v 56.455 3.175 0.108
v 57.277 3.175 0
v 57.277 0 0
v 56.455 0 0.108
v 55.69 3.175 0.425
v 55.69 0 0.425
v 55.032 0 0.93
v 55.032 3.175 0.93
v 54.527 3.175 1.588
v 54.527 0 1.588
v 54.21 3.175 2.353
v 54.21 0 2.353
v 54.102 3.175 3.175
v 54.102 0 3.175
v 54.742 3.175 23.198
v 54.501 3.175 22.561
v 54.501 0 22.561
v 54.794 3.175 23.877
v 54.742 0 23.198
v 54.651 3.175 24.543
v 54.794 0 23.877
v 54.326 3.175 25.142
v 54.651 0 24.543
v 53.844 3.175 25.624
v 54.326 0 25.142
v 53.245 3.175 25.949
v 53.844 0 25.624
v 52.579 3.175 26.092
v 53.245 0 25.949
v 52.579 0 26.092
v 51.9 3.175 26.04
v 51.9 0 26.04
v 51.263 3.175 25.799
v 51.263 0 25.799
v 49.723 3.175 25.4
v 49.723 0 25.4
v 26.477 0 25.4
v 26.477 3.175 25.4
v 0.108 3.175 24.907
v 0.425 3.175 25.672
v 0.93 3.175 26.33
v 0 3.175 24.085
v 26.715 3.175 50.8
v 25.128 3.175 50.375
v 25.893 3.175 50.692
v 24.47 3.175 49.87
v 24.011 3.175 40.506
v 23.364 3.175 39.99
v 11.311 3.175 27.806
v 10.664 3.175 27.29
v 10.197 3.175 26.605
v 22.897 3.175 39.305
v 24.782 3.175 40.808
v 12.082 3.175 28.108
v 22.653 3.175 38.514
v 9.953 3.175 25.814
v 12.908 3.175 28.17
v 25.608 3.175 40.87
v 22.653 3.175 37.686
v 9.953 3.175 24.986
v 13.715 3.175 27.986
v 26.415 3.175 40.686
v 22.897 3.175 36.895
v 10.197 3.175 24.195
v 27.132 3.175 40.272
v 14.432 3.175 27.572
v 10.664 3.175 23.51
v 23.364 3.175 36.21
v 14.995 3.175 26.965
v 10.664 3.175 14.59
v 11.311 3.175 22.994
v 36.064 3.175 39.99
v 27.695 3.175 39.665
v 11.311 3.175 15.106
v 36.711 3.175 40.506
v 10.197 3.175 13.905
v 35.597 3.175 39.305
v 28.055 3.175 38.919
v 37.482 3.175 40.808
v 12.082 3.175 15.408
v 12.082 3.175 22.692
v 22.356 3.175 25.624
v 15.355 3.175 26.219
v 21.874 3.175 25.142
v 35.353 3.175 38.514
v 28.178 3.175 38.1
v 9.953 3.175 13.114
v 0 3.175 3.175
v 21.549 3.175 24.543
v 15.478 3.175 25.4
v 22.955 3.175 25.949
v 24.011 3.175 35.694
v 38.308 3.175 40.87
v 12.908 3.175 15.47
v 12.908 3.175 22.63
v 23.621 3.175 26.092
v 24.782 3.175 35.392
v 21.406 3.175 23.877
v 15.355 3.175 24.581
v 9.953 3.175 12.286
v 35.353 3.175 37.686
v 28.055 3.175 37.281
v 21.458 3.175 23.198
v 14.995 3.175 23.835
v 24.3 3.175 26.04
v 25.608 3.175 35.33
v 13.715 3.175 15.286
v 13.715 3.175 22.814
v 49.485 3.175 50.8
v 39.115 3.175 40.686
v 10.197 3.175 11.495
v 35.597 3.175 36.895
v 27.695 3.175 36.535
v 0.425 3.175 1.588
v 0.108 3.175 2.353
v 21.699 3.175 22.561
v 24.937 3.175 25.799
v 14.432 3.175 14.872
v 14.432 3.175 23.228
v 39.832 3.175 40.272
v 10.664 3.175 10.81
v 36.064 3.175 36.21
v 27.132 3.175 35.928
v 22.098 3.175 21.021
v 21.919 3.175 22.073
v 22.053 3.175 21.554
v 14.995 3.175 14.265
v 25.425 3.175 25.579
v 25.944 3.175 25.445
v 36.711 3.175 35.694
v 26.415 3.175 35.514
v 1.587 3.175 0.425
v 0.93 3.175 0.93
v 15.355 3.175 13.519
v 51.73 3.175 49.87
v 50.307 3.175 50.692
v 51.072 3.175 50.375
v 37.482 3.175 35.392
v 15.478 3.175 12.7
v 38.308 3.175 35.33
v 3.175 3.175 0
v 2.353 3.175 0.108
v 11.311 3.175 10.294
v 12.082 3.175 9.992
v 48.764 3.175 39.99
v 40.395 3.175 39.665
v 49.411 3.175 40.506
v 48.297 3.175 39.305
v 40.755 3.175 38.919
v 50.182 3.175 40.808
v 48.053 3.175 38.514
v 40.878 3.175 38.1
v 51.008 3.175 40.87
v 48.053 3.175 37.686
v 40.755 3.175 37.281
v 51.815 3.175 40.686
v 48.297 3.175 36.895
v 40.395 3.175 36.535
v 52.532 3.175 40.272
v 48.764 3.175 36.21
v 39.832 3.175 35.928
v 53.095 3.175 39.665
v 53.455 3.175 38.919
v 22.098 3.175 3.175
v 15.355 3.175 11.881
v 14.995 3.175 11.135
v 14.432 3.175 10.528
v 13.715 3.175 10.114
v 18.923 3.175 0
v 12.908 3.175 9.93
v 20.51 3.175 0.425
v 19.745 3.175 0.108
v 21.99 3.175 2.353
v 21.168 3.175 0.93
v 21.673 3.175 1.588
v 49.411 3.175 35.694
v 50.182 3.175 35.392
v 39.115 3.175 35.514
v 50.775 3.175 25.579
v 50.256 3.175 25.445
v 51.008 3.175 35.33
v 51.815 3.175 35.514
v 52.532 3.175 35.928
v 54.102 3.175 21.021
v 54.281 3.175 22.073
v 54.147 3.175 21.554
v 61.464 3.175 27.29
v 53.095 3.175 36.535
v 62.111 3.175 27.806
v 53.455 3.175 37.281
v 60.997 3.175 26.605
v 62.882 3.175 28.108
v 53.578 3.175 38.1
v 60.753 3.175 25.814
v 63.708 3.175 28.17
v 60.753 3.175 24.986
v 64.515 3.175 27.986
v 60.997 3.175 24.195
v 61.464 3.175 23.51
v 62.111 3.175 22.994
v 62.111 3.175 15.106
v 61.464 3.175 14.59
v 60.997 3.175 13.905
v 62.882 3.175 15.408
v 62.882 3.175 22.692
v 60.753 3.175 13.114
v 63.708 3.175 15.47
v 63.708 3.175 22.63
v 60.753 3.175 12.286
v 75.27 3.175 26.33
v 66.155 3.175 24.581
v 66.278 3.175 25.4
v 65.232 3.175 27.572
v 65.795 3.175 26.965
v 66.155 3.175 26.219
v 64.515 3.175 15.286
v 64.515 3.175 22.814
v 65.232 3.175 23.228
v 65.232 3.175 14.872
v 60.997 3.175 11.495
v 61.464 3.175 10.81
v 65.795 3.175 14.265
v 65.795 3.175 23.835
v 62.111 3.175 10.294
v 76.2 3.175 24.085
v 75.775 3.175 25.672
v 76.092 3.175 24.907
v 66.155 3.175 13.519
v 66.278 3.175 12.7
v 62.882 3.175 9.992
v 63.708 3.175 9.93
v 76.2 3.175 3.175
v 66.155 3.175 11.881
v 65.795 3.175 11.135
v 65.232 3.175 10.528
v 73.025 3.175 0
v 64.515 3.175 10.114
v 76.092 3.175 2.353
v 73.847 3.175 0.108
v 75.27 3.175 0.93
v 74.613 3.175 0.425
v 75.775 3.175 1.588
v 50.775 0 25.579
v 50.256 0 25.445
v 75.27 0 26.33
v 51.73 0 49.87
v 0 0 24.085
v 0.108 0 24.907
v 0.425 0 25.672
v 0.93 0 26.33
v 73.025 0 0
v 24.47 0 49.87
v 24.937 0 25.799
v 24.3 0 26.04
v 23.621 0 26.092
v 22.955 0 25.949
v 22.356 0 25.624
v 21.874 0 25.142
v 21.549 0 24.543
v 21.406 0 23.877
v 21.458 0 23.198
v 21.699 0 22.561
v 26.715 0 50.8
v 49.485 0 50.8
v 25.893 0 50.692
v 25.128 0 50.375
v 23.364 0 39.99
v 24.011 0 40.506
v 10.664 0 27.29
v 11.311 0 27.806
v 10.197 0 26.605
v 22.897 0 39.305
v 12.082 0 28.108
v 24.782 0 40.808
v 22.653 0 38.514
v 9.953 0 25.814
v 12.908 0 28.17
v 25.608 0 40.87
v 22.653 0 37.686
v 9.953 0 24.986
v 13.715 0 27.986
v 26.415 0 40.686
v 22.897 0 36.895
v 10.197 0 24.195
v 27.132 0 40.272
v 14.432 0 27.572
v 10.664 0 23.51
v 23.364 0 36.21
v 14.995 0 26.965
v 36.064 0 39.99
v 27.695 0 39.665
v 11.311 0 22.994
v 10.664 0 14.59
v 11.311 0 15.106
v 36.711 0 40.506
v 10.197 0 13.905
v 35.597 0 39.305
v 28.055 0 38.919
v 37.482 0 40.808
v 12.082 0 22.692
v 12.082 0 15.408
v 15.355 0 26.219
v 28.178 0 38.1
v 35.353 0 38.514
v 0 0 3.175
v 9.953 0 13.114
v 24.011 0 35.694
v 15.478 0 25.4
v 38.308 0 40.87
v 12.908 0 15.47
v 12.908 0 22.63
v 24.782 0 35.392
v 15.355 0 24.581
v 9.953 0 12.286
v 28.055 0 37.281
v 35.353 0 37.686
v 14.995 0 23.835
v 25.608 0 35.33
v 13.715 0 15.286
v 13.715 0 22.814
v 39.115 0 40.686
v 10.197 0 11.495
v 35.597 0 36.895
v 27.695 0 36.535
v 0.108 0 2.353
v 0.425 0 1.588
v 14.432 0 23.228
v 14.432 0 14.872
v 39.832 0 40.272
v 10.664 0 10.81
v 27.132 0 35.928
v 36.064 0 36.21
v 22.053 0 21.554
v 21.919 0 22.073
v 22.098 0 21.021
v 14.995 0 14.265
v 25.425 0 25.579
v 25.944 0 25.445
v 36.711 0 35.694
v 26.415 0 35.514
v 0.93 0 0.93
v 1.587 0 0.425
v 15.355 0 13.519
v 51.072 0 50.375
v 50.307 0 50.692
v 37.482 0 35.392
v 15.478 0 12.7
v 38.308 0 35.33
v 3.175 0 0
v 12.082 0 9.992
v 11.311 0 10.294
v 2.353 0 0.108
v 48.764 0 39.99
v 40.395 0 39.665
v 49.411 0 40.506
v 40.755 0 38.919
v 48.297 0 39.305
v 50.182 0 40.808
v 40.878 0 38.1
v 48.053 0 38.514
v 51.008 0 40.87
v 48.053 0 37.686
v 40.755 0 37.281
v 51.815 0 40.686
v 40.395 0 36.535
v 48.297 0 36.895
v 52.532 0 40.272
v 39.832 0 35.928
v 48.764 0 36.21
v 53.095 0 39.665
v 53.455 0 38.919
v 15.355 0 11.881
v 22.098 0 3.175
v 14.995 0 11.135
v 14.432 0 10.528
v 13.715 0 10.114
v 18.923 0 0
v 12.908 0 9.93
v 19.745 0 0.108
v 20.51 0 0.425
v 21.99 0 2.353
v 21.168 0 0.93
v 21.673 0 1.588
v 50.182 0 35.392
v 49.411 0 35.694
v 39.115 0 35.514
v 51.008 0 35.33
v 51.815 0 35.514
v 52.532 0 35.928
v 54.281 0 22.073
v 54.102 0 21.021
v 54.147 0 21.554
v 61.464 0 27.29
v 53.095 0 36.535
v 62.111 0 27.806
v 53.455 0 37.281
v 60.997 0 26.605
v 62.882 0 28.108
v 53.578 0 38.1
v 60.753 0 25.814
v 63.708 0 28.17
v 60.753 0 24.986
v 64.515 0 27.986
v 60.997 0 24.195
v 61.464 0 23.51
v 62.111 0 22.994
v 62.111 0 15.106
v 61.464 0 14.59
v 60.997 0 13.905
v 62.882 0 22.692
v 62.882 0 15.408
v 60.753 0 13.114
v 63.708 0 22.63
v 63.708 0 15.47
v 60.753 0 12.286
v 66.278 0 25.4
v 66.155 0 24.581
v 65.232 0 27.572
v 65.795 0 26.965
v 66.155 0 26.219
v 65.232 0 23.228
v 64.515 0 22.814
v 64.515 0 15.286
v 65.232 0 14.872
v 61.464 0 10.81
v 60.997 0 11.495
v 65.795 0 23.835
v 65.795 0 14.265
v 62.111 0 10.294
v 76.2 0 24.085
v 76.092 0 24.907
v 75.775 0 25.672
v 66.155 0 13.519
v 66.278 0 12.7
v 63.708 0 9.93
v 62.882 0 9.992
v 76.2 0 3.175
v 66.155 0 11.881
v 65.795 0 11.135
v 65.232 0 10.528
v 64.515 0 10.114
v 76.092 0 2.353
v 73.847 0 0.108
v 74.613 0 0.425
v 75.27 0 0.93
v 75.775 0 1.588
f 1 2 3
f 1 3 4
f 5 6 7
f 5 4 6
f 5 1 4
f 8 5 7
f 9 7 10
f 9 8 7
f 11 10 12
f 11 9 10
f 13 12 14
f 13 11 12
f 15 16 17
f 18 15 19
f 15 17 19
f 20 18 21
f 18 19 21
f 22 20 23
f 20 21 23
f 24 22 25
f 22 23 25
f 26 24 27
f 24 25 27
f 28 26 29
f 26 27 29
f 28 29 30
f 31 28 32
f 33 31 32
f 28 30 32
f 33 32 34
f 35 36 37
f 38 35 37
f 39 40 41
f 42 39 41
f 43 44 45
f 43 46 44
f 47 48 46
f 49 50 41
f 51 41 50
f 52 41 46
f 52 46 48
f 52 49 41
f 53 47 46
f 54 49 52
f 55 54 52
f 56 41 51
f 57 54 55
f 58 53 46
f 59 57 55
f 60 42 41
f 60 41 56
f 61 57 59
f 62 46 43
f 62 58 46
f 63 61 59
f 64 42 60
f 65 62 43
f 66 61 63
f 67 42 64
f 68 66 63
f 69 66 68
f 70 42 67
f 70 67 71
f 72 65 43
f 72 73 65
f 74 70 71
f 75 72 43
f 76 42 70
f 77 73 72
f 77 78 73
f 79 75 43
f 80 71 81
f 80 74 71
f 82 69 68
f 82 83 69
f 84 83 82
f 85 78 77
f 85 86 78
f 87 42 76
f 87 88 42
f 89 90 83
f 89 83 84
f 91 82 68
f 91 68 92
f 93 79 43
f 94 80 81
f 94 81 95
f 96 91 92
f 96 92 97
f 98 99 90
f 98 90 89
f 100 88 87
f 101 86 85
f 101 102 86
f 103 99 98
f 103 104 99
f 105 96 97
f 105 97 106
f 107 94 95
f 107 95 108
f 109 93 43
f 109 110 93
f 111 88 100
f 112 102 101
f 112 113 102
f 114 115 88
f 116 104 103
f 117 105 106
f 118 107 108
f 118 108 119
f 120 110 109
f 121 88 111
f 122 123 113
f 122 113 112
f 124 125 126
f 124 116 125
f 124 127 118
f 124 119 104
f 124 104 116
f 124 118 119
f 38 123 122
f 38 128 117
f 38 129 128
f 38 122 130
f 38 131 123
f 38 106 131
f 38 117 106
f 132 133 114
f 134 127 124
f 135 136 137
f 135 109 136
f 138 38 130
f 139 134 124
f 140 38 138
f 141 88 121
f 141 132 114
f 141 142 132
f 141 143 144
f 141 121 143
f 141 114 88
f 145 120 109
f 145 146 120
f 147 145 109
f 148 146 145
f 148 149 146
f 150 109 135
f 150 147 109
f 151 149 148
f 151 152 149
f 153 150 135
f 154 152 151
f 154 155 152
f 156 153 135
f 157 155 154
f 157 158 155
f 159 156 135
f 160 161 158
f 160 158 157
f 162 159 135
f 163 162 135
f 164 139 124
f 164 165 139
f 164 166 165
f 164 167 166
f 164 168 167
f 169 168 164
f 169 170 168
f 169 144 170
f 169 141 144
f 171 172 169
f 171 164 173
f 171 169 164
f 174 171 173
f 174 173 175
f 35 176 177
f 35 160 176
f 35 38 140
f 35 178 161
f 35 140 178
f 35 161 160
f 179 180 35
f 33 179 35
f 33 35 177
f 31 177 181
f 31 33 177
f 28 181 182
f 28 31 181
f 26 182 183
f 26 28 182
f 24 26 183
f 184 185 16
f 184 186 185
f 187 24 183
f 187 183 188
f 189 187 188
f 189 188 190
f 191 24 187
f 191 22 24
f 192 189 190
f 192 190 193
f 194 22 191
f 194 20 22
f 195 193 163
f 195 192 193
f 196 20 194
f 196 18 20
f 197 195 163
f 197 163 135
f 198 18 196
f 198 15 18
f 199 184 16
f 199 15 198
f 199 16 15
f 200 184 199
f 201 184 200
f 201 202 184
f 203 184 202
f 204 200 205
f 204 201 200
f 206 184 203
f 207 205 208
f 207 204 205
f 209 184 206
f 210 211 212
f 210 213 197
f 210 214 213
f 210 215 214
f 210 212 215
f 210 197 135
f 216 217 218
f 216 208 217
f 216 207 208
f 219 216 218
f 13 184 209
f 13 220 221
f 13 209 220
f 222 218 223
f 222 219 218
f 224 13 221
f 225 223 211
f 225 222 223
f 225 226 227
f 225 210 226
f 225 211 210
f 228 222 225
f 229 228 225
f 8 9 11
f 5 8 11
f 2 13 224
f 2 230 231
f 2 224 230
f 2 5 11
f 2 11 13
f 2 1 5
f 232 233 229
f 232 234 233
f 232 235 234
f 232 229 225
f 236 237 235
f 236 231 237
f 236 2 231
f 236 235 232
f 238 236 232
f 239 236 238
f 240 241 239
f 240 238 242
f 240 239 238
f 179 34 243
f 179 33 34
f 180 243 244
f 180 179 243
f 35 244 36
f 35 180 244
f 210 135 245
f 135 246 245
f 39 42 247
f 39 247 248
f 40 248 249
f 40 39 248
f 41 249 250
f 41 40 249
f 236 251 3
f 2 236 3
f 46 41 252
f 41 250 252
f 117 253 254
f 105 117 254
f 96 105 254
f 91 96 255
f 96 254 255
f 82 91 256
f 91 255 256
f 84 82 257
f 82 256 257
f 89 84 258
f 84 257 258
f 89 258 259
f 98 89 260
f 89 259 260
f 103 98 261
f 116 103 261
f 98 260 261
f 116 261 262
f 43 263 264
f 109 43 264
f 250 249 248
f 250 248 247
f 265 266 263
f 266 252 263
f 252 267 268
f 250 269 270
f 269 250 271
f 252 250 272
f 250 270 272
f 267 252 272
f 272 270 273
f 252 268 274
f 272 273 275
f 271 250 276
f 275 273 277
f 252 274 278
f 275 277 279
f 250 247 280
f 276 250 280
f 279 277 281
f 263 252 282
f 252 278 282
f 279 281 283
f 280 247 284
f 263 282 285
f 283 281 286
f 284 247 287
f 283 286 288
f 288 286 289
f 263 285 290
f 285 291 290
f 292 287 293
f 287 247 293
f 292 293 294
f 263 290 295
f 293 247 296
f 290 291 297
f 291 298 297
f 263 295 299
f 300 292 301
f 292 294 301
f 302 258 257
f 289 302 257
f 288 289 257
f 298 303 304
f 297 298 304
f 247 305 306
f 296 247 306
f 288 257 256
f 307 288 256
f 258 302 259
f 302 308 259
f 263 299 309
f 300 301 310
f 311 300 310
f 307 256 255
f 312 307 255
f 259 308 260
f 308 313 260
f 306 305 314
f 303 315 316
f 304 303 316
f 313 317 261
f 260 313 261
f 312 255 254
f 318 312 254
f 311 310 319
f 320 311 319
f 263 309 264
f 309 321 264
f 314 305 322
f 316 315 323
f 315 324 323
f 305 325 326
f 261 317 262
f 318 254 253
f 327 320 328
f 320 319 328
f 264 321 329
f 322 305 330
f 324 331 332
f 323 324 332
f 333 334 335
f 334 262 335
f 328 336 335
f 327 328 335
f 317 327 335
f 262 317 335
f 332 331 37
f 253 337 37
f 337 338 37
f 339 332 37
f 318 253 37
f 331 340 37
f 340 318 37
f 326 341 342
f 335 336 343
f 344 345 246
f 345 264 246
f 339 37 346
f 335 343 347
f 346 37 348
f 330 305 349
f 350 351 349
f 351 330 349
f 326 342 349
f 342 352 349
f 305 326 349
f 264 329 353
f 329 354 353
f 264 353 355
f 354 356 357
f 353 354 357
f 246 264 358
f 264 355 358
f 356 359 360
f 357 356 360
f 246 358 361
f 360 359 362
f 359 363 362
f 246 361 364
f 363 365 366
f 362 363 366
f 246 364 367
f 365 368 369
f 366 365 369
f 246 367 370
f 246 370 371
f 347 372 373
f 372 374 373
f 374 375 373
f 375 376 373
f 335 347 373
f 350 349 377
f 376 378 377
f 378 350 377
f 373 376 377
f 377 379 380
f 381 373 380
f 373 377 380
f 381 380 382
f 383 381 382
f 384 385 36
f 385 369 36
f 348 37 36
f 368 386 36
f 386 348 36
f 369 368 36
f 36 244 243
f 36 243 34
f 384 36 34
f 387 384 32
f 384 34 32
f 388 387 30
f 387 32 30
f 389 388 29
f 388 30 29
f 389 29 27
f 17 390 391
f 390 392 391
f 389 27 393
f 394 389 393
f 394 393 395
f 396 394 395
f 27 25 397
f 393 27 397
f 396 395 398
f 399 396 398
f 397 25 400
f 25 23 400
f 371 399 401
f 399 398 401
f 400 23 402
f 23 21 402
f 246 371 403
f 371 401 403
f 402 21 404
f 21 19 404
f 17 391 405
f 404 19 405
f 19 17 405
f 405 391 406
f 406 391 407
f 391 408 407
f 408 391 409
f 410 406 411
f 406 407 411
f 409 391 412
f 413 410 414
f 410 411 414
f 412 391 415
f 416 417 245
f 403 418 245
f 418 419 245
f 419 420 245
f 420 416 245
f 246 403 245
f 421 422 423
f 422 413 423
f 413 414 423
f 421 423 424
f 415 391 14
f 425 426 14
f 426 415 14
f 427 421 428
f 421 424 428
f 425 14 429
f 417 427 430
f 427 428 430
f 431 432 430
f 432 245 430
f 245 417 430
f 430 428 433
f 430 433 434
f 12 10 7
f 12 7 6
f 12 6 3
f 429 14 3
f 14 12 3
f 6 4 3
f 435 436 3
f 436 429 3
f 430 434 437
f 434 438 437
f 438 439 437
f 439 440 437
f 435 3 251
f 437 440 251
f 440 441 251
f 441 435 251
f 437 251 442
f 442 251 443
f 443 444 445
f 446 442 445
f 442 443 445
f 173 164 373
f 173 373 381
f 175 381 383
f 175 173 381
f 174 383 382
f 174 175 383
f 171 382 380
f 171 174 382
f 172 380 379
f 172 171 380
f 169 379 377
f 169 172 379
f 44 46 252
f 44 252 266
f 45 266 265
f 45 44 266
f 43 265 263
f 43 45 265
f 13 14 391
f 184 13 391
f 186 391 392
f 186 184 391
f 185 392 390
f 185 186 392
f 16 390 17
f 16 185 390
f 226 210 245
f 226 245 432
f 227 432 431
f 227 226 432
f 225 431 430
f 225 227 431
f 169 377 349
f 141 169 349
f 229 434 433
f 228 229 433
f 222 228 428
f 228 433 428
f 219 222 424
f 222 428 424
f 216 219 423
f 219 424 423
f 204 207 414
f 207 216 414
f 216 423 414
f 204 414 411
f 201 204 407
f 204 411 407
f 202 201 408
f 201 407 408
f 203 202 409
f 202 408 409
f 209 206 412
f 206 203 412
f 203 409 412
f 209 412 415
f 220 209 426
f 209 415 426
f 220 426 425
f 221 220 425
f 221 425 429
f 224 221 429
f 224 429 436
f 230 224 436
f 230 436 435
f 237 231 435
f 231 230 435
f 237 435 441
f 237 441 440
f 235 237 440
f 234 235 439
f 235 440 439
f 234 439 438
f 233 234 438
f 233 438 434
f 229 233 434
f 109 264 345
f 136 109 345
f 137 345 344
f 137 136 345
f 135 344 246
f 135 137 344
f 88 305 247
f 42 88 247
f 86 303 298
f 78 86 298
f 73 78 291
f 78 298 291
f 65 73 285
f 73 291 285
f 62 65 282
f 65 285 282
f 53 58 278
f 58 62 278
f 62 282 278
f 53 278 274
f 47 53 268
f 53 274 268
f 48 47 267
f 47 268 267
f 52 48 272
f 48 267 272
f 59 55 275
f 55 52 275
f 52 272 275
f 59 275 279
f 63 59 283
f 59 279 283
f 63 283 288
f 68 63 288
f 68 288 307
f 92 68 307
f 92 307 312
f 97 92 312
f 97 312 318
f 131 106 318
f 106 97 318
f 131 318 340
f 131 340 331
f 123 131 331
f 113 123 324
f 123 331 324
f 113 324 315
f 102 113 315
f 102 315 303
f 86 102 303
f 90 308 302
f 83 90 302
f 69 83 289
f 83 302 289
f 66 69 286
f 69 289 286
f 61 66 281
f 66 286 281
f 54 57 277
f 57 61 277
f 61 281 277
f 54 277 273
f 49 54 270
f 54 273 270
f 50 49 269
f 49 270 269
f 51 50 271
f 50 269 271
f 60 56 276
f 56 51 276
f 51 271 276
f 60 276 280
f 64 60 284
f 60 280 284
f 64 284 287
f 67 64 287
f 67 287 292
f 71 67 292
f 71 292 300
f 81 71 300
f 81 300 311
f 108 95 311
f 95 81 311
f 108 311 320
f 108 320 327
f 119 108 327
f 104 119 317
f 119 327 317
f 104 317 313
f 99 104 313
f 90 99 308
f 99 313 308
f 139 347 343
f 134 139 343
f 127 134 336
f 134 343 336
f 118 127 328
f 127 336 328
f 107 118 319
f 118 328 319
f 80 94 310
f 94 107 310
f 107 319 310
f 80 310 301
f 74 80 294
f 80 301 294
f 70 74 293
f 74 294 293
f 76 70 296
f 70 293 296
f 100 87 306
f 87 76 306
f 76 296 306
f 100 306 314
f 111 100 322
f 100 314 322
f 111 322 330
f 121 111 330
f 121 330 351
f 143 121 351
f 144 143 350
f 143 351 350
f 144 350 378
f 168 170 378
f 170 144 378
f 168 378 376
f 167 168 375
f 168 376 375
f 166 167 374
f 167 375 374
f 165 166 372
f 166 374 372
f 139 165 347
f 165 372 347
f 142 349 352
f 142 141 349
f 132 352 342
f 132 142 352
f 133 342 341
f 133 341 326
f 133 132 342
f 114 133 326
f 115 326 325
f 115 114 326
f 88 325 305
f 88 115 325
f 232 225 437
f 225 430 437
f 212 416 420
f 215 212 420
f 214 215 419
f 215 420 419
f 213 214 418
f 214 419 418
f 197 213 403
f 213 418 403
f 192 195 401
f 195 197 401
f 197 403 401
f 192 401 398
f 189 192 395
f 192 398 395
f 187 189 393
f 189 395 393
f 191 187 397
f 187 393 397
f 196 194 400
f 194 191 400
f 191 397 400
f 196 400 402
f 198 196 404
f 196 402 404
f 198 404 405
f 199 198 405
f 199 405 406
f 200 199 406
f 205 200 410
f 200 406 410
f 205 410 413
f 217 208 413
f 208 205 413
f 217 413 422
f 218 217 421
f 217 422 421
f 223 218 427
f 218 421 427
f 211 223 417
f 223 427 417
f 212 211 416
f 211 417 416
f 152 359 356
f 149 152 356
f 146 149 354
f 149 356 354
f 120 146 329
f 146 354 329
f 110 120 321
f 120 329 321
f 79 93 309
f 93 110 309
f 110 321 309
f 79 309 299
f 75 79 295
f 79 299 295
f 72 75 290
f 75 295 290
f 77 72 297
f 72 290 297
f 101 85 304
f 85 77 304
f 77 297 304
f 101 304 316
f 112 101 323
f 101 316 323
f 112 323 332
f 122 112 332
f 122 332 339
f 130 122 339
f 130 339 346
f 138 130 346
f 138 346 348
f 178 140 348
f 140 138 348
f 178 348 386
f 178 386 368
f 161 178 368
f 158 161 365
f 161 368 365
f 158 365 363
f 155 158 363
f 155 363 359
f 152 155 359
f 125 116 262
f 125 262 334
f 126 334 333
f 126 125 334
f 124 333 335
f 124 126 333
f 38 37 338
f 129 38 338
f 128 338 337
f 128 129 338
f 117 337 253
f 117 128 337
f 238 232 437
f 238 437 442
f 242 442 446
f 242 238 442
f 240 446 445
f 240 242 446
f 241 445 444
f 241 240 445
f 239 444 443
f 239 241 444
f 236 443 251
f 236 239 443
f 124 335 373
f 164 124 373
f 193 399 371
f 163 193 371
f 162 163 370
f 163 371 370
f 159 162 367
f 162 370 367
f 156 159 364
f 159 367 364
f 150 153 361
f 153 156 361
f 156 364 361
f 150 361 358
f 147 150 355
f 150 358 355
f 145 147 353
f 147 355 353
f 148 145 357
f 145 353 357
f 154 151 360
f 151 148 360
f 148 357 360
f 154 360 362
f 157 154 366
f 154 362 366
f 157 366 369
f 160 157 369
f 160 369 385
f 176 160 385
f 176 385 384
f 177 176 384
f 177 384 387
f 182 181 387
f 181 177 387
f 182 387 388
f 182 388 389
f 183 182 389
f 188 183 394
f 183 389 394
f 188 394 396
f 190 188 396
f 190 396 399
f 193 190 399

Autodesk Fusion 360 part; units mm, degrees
sketch "Sketch1" plane through (0, 0, 0) normal (0, 1, 0) x (1, 0, 0)
  line L0 (0, 0) -> (0, -25.4)
  line L1 (76.2, -25.4) -> (76.2, 0)
  line L2 (76.2, 0) -> (54.102, 0)
  line L3 (54.102, 0) -> (54.102, -25.4)
  line L4 (54.102, -25.4) -> (22.098, -25.4)
  line L5 (22.098, -25.4) -> (22.098, 0)
  line L6 (22.098, 0) -> (0, 0)
  line L7 (38.1, -25.4) -> (38.1, -50.8) construction
  circle A0 centre (23.7818, -23.7162) radius 2.3813
  line L8 (23.7818, -23.7162) -> (23.7818, -25.4) construction
  line L9 (23.7818, -23.7162) -> (22.098, -23.7162) construction
  circle A1 centre (12.7, -12.7) radius 2.7781
  line L10 (0, -25.4) -> (25.4, -50.8)
  line L11 (25.4, -50.8) -> (50.8, -50.8)
  line L12 (50.8, -50.8) -> (76.2, -25.4)
  circle A2 centre (12.7, -25.4) radius 2.7781
  circle A3 centre (25.4, -38.1) radius 2.7781
  circle A4 centre (38.1, -38.1) radius 2.7781
  circle A5 centre (50.8, -38.1) radius 2.7781
  circle A6 centre (63.5, -12.7) radius 2.7781
  circle A7 centre (63.5, -25.4) radius 2.7781
  circle A8 centre (52.4182, -23.7162) radius 2.3813
  dimension "d1" = 76.2
  dimension "d3" = 32.004
  dimension "d4" = 25.4
  dimension "d6" = 25.4
  dimension "d8" = 4.7625
  dimension "d9" = 5.5563
  dimension "d10" = 12.7
  dimension "d26" = 25.4
  dimension "d43" = 25.4
  dimension "d44" = 12.7
  dimension "d47" = -25.4
  dimension "d48" = -50.8
extrude "Extrude1" add sketch "Sketch1" along normal blind 3.175 contours L0 L1 L2 L3 L4 L5 L6 A0 L10 L11 L12 A8
fillet "Fillet1" radius 3.175 8 edges at (0, 1.5875, 0) (22.098, 1.5875, 0) (54.102, 1.5875, 0) (76.2, 1.5875, 0) (0, 1.5875, 25.4) (25.4, 1.5875, 50.8) (50.8, 1.5875, 50.8) (76.2, 1.5875, 25.4)
fillet "Fillet1" radius 3.175 4 edges at (25.4656, 1.5875, 25.4) (22.098, 1.5875, 22.0324) (50.7344, 1.5875, 25.4) (54.102, 1.5875, 22.0324)
sketch "DXF" plane through (0, 0, 0) normal (0, -1, 0) x (1, 0, 0)
  circle A0 centre (38.1, 38.1) radius 2.7781
  circle A1 centre (12.7, 12.7) radius 2.7781
  circle A2 centre (25.4, 38.1) radius 2.7781
  circle A3 centre (12.7, 25.4) radius 2.7781
  circle A4 centre (63.5, 12.7) radius 2.7781
  circle A5 centre (63.5, 25.4) radius 2.7781
  circle A6 centre (50.8, 38.1) radius 2.7781
  arc A7 (54.5005, 22.5611) -> (54.102, 21.021) centre (57.277, 21.021) ccw
  line L0 (54.102, 21.021) -> (54.102, 3.175)
  arc A8 (54.102, 3.175) -> (57.277, 0) centre (57.277, 3.175) ccw
  line L1 (57.277, 0) -> (73.025, 0)
  arc A9 (73.025, 0) -> (76.2, 3.175) centre (73.025, 3.175) ccw
  line L2 (76.2, 3.175) -> (76.2, 24.0849)
  arc A10 (76.2, 24.0849) -> (75.2701, 26.3299) centre (73.025, 24.0849) ccw
  line L3 (75.2701, 26.3299) -> (51.7299, 49.8701)
  arc A11 (51.7299, 49.8701) -> (49.4849, 50.8) centre (49.4849, 47.625) ccw
  line L4 (49.4849, 50.8) -> (26.7151, 50.8)
  arc A12 (26.7151, 50.8) -> (24.4701, 49.8701) centre (26.7151, 47.625) ccw
  line L5 (24.4701, 49.8701) -> (0.9299, 26.3299)
  arc A13 (0.9299, 26.3299) -> (0, 24.0849) centre (3.175, 24.0849) ccw
  line L6 (0, 24.0849) -> (0, 3.175)
  arc A14 (0, 3.175) -> (3.175, 0) centre (3.175, 3.175) ccw
  line L7 (3.175, 0) -> (18.923, 0)
  arc A15 (18.923, 0) -> (22.098, 3.175) centre (18.923, 3.175) ccw
  line L8 (22.098, 3.175) -> (22.098, 21.021)
  arc A16 (22.098, 21.021) -> (21.6995, 22.5611) centre (18.923, 21.021) ccw
  arc A17 (24.9369, 25.7985) -> (21.6995, 22.5611) centre (23.7818, 23.7162) ccw
  arc A18 (24.9369, 25.7985) -> (26.477, 25.4) centre (26.477, 28.575) ccw
  line L9 (26.477, 25.4) -> (49.723, 25.4)
  arc A19 (49.723, 25.4) -> (51.2631, 25.7985) centre (49.723, 28.575) ccw
  arc A20 (54.5005, 22.5611) -> (51.2631, 25.7985) centre (52.4182, 23.7162) ccw
equation "TOLERANCE = 0.01 in" comment "Tube size tolerance"
equation "d3 = 1 in + 2 * PLATE_THICKNESS + TOLERANCE"
equation "d9 = ( 7 / 32 ) * 1 in"
equation "HOLE_DIAMETER = ( 7 / 32 ) * 1 in"
equation "PLATE_THICKNESS = 0.125 in" comment "Non-zero if you want this to overlap other plates"
